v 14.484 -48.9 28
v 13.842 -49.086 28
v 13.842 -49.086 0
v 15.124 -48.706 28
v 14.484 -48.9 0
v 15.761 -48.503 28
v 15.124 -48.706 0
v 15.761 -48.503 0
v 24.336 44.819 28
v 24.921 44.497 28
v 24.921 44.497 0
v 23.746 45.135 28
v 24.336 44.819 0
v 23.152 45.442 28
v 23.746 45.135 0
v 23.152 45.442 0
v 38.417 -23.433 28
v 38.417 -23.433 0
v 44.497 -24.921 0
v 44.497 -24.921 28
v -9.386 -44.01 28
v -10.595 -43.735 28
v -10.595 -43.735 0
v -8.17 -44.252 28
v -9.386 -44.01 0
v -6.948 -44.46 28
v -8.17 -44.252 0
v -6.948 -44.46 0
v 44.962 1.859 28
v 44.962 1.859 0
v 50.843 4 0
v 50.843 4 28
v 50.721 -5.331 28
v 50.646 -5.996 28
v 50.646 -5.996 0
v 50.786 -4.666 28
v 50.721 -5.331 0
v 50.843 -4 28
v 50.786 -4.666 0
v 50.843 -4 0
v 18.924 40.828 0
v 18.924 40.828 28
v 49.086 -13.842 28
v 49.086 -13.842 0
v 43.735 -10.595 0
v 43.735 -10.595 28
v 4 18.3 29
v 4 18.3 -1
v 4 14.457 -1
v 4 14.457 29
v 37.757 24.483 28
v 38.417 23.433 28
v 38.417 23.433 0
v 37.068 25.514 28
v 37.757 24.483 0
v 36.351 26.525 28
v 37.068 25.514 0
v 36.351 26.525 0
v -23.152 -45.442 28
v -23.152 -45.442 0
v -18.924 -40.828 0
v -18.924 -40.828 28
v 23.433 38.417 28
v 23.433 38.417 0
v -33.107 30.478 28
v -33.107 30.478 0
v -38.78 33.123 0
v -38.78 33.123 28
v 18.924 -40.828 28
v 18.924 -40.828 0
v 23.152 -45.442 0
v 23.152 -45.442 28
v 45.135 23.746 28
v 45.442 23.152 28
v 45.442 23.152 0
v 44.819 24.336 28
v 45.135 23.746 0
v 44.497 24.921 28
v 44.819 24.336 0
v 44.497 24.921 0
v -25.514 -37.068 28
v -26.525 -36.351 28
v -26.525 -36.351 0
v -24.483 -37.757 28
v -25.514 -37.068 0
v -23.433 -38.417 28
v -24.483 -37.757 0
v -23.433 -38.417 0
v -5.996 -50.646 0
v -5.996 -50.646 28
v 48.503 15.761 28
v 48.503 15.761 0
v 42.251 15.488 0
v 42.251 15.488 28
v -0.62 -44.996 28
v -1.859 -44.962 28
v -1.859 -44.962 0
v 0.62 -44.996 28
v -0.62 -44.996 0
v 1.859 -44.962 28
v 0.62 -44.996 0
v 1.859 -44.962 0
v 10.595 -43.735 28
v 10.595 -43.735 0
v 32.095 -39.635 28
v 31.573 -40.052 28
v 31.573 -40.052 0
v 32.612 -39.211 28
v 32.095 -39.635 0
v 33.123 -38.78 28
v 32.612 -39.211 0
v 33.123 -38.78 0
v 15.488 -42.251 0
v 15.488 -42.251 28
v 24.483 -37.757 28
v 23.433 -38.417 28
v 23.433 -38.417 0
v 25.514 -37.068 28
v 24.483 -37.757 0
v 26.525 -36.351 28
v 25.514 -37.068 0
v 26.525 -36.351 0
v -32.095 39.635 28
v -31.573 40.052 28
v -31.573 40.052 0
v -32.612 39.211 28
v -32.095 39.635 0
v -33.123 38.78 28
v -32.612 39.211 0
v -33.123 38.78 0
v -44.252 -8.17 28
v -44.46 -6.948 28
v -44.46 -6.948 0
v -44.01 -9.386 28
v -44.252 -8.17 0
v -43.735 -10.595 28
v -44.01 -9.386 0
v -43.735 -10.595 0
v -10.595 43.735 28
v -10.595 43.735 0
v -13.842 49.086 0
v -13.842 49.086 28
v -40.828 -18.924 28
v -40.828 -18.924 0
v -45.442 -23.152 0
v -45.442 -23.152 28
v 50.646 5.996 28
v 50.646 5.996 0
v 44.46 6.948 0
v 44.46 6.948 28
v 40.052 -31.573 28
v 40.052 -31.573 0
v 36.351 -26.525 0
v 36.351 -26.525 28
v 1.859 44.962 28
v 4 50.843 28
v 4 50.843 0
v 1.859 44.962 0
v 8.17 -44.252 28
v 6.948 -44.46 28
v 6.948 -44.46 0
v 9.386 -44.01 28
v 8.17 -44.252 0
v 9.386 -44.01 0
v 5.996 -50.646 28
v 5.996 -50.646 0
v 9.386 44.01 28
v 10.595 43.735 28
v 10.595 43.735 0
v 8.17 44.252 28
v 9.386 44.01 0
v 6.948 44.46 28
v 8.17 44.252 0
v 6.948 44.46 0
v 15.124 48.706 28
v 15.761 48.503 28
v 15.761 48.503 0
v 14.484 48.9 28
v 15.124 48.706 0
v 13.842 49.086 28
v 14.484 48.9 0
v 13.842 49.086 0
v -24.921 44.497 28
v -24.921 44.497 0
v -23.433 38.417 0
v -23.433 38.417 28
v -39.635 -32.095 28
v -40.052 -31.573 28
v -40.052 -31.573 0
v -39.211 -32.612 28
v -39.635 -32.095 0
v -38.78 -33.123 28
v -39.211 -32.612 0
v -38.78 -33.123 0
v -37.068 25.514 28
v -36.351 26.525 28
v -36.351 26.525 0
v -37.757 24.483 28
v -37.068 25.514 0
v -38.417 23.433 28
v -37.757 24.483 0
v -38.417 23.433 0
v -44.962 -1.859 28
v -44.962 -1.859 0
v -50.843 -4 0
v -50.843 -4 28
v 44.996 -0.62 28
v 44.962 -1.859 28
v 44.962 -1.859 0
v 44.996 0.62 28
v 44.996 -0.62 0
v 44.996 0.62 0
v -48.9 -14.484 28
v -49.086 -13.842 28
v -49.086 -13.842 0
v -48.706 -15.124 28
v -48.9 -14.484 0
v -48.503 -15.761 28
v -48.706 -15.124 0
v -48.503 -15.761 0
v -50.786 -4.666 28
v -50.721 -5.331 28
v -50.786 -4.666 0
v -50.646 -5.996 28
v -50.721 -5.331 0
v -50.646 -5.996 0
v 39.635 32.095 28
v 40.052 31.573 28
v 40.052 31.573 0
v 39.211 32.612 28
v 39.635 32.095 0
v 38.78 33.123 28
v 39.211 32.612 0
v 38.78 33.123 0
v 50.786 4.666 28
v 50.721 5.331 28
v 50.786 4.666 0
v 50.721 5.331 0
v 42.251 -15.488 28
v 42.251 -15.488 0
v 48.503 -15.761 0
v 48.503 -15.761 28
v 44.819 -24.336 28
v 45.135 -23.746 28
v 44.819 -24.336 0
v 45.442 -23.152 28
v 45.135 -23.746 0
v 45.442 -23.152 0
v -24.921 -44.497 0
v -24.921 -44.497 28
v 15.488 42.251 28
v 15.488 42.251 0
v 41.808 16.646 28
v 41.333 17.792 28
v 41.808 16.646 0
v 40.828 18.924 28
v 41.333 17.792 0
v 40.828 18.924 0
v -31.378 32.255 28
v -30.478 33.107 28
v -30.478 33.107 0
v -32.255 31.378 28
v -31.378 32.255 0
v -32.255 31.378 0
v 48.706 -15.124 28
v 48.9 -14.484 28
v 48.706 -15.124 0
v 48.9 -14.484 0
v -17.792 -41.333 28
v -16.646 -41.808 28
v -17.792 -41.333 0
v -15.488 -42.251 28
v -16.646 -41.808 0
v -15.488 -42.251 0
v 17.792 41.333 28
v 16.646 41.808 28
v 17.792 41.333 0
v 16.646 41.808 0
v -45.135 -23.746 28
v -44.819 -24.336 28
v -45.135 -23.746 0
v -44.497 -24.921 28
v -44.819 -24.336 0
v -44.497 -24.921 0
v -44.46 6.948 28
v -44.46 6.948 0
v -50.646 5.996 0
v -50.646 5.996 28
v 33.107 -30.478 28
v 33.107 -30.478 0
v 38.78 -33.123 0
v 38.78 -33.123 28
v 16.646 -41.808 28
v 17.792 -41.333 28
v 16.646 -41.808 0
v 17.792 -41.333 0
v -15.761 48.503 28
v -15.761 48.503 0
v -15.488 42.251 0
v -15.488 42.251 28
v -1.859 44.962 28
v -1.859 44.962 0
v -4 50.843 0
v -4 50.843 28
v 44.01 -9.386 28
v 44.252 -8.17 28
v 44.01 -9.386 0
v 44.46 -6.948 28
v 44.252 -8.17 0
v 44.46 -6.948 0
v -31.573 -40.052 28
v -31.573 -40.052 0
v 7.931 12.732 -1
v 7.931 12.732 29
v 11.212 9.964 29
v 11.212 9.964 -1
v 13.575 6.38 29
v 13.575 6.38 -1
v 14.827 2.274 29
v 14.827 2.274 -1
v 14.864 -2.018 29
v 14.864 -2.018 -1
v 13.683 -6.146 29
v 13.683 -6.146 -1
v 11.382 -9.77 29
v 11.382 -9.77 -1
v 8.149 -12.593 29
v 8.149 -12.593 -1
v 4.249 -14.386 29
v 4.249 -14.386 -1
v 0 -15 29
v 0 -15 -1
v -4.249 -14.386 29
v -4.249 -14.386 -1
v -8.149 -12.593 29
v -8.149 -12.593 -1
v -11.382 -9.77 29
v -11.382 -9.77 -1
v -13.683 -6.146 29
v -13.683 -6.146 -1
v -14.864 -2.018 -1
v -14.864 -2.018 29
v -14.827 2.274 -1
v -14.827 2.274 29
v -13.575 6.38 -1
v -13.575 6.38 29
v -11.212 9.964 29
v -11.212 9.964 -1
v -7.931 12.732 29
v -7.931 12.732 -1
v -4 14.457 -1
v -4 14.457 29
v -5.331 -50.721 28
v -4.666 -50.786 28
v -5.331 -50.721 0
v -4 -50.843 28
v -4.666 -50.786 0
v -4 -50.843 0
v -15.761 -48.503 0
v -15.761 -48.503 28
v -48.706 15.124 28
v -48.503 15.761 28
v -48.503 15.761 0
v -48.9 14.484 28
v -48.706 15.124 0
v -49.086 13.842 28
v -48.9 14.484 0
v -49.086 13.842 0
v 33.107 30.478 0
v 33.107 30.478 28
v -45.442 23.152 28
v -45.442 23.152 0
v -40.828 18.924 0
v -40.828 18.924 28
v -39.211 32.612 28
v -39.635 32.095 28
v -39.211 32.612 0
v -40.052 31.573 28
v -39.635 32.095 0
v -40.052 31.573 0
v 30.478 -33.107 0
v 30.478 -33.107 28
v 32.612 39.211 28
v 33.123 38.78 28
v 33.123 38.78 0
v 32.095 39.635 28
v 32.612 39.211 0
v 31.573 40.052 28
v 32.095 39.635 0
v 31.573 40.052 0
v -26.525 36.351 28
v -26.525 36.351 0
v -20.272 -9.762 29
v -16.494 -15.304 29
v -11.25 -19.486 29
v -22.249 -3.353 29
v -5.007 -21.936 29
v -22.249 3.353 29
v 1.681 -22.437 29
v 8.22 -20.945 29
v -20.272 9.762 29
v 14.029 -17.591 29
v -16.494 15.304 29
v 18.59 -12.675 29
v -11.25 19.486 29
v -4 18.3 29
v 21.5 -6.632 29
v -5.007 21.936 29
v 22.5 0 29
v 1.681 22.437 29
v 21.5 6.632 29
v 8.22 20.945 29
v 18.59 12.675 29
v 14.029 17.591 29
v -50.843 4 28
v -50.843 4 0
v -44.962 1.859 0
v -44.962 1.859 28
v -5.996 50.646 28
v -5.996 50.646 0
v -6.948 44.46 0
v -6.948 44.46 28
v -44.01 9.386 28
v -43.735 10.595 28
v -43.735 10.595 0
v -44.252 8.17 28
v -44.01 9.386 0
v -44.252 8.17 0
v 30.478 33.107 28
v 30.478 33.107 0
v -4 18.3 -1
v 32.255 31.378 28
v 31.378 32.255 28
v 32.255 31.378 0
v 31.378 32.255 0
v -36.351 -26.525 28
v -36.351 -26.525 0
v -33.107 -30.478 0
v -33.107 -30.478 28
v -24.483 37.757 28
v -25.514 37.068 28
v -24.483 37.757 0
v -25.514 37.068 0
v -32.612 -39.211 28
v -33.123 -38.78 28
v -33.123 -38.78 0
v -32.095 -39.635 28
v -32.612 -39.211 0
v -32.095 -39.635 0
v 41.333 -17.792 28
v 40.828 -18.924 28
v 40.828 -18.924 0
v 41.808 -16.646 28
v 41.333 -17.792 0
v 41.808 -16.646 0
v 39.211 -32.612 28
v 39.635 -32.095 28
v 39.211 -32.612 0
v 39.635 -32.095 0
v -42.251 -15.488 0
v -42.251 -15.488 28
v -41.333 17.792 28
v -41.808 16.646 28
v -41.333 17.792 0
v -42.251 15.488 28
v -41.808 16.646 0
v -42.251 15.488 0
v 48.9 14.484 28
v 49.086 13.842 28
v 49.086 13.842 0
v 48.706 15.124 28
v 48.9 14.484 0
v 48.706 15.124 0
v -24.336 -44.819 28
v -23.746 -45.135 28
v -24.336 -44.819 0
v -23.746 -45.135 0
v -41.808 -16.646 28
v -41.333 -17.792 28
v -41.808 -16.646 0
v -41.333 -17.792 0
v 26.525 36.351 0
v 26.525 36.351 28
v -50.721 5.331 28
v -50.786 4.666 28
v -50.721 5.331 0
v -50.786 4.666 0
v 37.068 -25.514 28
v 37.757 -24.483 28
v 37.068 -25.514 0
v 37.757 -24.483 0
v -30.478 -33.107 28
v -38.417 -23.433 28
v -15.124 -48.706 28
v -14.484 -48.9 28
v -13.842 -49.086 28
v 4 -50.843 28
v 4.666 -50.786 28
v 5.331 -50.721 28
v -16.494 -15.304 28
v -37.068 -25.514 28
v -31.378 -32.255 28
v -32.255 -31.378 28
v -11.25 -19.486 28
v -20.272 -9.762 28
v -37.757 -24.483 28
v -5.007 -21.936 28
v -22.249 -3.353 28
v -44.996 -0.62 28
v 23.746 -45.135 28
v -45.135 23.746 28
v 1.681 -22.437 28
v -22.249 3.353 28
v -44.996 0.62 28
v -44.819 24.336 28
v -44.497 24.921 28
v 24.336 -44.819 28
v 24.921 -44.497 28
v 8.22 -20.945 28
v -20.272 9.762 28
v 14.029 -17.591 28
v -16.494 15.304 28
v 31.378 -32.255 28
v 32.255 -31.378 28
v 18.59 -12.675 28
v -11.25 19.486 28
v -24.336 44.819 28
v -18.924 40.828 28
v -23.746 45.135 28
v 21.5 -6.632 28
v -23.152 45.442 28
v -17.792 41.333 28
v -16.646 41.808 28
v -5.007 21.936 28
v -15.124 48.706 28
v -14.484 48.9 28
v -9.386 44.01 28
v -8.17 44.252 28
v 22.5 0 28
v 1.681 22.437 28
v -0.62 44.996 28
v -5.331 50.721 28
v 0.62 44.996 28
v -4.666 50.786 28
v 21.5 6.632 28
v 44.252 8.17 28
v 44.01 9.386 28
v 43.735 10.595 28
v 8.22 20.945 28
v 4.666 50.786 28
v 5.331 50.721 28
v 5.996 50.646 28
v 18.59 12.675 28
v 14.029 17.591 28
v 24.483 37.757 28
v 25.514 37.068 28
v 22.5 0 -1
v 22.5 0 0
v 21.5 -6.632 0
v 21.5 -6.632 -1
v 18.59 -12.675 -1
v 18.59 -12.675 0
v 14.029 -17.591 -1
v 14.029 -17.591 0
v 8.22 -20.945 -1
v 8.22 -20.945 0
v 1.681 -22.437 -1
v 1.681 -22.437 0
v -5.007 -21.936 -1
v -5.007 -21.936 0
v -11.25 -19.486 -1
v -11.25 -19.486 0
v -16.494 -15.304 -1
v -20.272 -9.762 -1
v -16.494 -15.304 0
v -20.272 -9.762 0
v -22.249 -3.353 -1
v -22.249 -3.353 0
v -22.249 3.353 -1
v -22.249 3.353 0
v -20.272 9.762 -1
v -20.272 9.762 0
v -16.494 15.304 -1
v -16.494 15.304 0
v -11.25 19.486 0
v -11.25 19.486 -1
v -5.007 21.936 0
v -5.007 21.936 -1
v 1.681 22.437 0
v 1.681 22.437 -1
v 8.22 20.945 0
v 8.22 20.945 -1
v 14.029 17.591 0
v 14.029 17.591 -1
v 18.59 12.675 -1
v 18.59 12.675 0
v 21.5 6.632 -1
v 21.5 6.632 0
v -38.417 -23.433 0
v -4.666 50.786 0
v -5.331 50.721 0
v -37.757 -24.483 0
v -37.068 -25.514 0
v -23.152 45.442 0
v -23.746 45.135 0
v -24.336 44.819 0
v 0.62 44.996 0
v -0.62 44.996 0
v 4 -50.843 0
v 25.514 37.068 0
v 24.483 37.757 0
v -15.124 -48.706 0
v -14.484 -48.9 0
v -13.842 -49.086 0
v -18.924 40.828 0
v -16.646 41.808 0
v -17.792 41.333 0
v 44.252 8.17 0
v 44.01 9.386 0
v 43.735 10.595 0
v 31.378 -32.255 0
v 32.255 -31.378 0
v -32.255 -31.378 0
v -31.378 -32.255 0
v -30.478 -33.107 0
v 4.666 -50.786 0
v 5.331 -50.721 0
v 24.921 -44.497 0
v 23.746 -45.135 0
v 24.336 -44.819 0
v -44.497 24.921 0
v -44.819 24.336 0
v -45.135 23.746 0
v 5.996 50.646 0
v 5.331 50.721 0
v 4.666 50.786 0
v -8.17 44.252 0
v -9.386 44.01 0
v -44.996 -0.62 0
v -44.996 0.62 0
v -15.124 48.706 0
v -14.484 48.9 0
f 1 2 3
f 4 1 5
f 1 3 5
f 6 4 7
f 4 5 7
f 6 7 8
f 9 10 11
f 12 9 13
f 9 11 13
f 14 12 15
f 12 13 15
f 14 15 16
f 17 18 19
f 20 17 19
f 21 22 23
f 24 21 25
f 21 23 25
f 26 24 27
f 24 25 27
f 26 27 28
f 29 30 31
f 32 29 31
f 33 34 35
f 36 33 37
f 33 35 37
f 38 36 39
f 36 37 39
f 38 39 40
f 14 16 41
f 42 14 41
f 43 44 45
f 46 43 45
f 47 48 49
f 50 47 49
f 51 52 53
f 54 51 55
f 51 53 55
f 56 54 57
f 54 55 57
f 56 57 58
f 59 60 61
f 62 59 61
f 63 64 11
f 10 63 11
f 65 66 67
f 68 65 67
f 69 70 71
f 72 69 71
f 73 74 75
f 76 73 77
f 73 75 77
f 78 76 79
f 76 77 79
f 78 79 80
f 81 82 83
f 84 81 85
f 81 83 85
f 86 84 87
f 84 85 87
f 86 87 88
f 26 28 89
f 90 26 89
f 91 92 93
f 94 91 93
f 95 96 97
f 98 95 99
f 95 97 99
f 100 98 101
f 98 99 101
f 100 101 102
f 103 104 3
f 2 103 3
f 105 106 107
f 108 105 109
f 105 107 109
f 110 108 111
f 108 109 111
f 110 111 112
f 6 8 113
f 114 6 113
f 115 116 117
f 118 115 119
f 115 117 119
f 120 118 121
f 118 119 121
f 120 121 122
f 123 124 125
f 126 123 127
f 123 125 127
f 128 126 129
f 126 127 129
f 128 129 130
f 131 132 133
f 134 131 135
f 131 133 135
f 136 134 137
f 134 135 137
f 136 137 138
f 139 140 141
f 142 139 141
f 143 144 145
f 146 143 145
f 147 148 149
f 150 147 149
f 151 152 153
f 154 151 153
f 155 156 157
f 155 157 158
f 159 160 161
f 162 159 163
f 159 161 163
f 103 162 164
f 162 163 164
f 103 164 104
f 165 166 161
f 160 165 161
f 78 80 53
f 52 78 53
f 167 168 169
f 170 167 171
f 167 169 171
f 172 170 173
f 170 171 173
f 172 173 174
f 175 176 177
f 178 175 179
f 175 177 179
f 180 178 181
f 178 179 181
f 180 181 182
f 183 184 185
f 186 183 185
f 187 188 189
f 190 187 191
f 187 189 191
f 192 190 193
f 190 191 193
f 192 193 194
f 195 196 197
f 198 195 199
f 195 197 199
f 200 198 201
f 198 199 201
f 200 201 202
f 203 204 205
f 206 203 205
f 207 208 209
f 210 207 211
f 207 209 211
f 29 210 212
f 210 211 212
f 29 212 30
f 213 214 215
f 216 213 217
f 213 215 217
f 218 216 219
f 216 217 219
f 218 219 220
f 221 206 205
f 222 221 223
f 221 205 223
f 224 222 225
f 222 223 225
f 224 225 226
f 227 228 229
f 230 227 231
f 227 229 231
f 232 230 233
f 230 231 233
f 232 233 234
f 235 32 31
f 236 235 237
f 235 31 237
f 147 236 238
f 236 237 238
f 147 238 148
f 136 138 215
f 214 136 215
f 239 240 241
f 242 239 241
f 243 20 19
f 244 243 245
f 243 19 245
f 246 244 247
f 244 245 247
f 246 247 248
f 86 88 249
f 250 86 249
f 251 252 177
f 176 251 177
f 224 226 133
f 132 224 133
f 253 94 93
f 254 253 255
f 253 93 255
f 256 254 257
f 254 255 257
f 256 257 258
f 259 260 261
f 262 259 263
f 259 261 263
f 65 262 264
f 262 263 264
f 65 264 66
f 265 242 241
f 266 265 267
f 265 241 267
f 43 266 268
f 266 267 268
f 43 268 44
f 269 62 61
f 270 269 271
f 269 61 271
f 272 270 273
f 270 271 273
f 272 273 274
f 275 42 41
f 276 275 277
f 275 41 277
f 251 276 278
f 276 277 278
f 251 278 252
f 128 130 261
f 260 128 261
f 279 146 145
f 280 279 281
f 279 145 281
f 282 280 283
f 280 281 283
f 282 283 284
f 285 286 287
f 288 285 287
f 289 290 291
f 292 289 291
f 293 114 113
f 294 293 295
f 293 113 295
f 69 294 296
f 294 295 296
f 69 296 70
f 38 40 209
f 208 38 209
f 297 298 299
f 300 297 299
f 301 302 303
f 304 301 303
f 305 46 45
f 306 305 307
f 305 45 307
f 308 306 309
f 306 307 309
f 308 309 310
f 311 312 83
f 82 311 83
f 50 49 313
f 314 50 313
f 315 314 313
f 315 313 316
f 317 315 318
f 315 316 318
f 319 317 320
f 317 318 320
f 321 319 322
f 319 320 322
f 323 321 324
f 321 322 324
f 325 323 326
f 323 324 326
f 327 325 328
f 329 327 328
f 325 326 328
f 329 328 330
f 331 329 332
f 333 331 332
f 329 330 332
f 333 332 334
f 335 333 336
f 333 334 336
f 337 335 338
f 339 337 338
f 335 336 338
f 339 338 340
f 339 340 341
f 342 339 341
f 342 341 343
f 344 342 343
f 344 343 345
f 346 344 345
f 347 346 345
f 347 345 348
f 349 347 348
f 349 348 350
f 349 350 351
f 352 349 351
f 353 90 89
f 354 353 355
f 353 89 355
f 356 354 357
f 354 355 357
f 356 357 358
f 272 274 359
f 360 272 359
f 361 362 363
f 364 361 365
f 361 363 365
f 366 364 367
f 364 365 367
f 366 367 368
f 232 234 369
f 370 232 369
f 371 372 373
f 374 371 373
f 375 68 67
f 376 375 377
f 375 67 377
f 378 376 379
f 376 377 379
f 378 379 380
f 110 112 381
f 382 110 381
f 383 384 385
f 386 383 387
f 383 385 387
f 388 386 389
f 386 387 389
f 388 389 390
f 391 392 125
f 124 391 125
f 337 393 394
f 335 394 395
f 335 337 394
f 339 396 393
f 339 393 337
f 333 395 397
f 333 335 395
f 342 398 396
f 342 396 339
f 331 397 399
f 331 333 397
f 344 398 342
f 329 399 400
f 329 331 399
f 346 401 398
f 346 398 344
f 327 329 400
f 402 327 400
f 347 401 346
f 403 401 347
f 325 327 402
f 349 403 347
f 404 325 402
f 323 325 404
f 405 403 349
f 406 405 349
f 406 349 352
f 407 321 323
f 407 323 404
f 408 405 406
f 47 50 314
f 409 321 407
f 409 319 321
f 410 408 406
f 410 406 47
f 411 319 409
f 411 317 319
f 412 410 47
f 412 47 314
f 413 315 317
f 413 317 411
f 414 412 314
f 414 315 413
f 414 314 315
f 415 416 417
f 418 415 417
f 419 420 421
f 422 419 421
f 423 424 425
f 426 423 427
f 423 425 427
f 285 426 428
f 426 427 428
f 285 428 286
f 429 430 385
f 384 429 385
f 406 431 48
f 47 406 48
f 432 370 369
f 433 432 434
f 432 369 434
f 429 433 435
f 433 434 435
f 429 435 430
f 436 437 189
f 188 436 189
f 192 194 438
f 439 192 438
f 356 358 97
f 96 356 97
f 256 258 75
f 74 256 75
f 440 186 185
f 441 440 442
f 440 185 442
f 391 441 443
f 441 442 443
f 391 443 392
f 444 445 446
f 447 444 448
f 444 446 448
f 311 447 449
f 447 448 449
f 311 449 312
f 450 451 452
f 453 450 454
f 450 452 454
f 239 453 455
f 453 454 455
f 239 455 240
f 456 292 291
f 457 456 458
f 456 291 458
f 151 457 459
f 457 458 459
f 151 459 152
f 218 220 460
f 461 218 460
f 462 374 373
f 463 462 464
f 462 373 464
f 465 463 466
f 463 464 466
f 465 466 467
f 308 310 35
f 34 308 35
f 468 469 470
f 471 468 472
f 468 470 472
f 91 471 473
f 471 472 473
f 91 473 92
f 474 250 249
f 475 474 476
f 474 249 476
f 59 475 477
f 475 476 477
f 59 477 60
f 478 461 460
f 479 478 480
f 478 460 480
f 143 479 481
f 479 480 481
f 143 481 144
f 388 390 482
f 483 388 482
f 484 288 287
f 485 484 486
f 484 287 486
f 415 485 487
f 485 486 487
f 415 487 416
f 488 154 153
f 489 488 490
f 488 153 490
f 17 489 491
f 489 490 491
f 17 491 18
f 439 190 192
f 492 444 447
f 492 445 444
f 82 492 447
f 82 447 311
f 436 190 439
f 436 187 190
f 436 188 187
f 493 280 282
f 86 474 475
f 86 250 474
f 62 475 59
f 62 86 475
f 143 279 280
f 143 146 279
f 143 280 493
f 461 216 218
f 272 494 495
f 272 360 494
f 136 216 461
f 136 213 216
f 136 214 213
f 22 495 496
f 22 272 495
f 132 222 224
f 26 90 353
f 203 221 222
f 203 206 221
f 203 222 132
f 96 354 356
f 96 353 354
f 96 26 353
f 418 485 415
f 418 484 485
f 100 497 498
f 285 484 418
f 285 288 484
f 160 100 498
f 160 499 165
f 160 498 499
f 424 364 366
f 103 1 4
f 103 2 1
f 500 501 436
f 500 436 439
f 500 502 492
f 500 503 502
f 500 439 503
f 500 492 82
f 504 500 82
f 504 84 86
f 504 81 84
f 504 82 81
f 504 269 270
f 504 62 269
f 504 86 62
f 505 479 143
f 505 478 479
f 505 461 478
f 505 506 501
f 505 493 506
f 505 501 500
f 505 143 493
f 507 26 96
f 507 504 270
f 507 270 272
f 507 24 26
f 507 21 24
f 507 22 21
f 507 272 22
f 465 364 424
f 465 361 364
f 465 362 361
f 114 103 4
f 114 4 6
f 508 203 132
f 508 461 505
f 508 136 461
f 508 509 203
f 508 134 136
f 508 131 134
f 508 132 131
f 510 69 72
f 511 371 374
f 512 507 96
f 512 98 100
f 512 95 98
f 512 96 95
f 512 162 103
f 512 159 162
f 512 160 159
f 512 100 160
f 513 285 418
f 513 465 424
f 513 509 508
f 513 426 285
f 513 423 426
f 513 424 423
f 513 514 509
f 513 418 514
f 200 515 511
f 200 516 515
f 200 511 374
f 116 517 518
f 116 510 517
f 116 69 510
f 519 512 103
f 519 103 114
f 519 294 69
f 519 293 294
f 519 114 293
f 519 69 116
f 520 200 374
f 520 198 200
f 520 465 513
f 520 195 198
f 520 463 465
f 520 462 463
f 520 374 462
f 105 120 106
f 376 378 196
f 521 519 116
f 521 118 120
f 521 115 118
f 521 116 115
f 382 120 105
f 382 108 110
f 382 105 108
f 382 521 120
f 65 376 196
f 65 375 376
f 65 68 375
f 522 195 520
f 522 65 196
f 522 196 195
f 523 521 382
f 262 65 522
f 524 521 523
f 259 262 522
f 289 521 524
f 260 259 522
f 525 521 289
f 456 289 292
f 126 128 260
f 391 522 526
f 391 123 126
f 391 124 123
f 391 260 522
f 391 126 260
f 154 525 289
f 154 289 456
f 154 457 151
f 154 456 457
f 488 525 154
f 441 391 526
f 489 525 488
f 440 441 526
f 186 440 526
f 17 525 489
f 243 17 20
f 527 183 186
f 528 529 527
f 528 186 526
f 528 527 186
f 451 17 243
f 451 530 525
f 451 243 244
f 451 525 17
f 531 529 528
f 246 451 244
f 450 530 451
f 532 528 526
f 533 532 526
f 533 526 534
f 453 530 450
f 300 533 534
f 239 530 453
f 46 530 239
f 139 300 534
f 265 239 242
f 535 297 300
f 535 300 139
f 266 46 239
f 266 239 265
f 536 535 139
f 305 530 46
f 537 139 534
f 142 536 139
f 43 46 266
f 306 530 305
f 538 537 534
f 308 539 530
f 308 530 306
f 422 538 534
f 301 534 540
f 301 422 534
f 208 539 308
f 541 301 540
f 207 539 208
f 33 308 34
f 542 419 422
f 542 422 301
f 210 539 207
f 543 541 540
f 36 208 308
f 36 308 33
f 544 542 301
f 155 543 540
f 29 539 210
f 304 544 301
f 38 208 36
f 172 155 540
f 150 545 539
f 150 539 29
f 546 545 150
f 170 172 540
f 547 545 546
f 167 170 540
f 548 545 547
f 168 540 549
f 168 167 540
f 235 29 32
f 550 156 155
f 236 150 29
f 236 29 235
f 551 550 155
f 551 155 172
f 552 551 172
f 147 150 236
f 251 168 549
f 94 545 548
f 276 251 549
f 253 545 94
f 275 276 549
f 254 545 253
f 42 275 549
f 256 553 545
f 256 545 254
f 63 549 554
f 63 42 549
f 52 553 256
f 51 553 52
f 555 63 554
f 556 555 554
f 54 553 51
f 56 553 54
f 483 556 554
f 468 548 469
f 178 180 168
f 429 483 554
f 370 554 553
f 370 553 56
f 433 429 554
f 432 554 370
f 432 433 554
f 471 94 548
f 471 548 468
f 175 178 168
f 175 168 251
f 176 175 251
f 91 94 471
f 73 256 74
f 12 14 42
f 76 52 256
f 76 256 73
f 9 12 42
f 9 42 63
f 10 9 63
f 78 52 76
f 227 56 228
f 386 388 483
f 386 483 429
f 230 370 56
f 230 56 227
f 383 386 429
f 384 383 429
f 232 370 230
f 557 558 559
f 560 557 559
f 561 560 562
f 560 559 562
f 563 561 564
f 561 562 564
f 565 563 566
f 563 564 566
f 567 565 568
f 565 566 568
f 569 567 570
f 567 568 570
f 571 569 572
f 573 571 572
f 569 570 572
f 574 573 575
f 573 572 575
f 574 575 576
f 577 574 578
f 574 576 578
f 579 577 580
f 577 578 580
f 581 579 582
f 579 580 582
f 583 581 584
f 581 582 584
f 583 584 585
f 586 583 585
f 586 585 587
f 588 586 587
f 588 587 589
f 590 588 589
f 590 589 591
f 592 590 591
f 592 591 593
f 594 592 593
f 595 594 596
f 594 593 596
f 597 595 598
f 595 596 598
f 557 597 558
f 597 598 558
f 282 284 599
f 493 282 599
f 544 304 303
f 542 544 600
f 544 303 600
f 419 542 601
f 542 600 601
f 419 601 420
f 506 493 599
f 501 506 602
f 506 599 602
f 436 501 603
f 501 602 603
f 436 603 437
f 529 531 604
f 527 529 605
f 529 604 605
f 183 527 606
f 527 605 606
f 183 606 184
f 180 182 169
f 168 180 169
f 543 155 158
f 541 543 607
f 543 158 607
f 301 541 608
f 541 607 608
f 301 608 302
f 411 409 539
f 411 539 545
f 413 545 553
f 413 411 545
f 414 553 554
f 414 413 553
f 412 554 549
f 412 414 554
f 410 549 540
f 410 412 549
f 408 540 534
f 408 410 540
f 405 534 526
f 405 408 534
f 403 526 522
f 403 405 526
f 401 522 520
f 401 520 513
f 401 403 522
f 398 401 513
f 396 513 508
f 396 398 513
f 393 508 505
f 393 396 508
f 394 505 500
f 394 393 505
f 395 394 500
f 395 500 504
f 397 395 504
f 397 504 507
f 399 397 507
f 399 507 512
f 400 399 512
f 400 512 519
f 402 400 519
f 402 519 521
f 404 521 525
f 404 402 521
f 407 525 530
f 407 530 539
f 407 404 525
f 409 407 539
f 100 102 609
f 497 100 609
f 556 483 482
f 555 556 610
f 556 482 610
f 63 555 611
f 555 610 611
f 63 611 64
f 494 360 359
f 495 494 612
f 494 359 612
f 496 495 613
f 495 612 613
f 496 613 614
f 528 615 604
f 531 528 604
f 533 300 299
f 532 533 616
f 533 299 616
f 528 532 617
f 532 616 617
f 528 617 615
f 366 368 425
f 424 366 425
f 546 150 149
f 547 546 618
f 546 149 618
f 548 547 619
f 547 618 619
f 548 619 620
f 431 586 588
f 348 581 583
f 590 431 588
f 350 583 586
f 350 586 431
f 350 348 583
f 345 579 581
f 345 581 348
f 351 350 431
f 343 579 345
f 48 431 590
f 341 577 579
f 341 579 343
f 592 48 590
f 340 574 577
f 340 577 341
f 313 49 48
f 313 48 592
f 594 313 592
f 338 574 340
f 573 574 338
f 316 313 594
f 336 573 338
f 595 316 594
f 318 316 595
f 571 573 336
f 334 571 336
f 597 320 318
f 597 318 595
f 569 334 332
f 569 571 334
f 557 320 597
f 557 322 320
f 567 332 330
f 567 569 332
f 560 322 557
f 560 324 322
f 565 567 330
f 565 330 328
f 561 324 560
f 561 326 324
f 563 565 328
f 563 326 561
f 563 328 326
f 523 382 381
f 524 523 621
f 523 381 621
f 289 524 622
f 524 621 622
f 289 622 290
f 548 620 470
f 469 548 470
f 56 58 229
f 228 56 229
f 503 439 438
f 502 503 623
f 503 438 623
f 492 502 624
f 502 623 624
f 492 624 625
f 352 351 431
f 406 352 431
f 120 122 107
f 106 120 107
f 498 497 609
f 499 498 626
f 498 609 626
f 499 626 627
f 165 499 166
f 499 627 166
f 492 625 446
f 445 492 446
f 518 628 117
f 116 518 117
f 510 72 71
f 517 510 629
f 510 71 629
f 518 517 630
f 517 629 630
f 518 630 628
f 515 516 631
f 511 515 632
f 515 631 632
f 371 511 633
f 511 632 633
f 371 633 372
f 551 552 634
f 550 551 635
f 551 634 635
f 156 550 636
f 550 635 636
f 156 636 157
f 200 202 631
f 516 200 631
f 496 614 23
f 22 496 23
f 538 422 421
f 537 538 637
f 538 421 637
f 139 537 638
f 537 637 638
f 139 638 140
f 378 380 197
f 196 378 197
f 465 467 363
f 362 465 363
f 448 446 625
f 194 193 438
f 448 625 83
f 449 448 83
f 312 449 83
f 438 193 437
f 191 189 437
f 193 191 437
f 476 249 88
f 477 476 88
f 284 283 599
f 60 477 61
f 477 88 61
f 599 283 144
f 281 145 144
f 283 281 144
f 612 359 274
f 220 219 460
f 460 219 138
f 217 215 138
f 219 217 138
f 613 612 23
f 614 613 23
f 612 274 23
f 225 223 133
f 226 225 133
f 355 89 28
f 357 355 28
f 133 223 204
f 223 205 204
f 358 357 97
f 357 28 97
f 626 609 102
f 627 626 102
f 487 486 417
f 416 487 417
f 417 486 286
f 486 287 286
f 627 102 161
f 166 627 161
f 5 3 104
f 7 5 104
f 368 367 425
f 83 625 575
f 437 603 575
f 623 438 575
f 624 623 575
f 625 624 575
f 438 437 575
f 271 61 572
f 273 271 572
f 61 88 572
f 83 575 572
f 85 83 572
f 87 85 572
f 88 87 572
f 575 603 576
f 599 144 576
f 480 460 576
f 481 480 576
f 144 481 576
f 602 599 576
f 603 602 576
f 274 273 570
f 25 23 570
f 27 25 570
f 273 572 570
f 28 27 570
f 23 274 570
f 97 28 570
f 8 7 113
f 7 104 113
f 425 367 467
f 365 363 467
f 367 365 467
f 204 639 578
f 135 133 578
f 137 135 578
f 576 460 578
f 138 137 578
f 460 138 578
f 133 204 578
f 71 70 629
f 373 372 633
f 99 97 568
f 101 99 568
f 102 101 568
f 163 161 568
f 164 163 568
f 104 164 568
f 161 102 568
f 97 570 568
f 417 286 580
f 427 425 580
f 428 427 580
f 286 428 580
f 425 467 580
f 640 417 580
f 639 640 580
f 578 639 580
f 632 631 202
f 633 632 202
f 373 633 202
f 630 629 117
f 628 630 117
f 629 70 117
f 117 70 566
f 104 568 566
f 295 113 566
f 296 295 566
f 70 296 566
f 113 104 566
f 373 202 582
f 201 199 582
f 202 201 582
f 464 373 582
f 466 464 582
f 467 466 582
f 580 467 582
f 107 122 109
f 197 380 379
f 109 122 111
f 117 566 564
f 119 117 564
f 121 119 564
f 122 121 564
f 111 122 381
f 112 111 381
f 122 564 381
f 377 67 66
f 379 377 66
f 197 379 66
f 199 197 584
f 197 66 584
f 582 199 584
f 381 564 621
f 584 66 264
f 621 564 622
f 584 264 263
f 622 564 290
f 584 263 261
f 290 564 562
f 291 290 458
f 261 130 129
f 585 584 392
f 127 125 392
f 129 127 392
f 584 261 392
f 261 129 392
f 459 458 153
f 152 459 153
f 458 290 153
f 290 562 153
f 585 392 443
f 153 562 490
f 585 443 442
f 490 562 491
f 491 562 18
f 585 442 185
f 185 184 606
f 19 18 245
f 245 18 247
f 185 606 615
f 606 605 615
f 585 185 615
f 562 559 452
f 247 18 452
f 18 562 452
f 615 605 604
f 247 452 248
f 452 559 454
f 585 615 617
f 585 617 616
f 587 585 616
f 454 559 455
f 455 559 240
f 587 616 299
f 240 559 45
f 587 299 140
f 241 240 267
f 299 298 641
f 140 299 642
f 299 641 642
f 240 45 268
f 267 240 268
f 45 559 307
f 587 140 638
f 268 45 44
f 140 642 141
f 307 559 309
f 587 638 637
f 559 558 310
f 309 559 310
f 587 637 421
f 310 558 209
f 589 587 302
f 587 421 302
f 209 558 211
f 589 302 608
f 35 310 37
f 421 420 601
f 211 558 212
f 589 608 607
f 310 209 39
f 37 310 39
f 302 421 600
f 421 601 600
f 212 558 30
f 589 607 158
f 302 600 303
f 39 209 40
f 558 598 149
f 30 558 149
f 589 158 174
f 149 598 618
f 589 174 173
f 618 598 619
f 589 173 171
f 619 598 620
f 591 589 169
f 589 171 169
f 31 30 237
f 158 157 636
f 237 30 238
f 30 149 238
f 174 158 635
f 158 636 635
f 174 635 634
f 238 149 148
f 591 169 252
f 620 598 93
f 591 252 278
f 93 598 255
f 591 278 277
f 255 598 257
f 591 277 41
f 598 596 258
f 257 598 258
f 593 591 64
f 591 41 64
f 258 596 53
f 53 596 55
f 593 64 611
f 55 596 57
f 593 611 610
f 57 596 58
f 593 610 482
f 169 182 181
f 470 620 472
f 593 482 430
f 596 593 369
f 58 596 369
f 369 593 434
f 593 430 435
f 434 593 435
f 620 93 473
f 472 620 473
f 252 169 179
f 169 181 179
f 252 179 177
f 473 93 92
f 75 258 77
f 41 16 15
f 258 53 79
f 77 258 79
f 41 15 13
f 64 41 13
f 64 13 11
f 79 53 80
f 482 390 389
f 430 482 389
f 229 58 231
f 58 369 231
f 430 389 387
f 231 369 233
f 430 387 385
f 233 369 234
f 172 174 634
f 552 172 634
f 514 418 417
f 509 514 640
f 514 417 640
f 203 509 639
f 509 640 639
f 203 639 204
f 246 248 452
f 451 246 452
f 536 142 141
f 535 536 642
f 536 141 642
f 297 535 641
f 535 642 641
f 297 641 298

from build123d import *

# Parameters (mm, degrees)
SKETCH_1_R               = 51
EXTRUDE_1_DEPTH          = 28
SKETCH_2_R               = 22.5
EXTRUDE_2_DEPTH          = 1
EXTRUDE_START            = 1
SKETCH_3_R               = 22.5
EXTRUDE_3_DEPTH          = 1
CUT_EXTRUDE_1_REACH      = 80.115
CUT_EXTRUDE_2_REACH      = 79.737
PATTERN_CIRCULAR_1_COUNT = 32


with BuildPart() as part:
    # 草图1 → 凸台-拉伸1 (new body)
    with BuildSketch(Plane.XY):
        Circle(SKETCH_1_R)
    extrude(amount=EXTRUDE_1_DEPTH)

    # 草图2 → 凸台-拉伸2 (add)
    with BuildSketch(Plane(origin=(0, 0, 0), x_dir=(-1, 0, 0), z_dir=(0, 0, -1))):
        with Locations(Location((0, 0, 0), (0, 0, 180))):
            Circle(SKETCH_2_R)
    extrude(amount=EXTRUDE_2_DEPTH)

    # 草图3 → 凸台-拉伸3 (add)
    with BuildSketch(Plane.XY.offset(28).offset(EXTRUDE_START)):
        Circle(SKETCH_3_R)
    extrude(amount=-EXTRUDE_3_DEPTH)

    # 草图4 → 切除-拉伸1 (cut, up to next)
    with BuildSketch(Plane(origin=(0, 0, -1), x_dir=(-1, 0, 0), z_dir=(0, 0, -1)), mode=Mode.PRIVATE) as cut_extrude_1_sk1:
        with BuildLine():
            Line((-4, 18.3), (-4, 14.456832295))
            ThreePointArc((-4, 14.456832295), (0, -15), (4, 14.456832295))
            Line((4, 14.456832295), (4, 18.3))
            Line((4, 18.3), (-4, 18.3))
        make_face()
    cut_extrude_1_tool1 = extrude(cut_extrude_1_sk1.sketch, amount=-CUT_EXTRUDE_1_REACH, mode=Mode.PRIVATE) & part.part
    add(cut_extrude_1_tool1.solids().sort_by_distance((0, 0.627325, -1))[0], mode=Mode.SUBTRACT)

    # 草图5 → 切除-拉伸2 (cut, up to next)
    with BuildSketch(Plane(origin=(0, 0, 0), x_dir=(-1, 0, 0), z_dir=(0, 0, -1)), mode=Mode.PRIVATE) as cut_extrude_2_sk1:
        with BuildLine():
            Line((-4, 50.842895276), (-1.859372488, 44.961569523))
            ThreePointArc((-1.859372488, 44.961569523), (0, 45), (1.859372488, 44.961569523))
            Line((1.859372488, 44.961569523), (4, 50.842895276))
            ThreePointArc((4, 50.842895276), (0, 51), (-4, 50.842895276))
        make_face()
    cut_extrude_2_tool1 = extrude(cut_extrude_2_sk1.sketch, amount=-CUT_EXTRUDE_2_REACH, mode=Mode.PRIVATE) & part.part
    cut_extrude_2 = cut_extrude_2_tool1.solids().sort_by_distance((0, 48.332211, 0))[0]
    add(cut_extrude_2, mode=Mode.SUBTRACT)

    # 阵列(圆周)1: 切除-拉伸2 ×32 about axis
    pattern_circular_1_axis = Axis((0, 0, 0), (0, 0, 1))
    for i in range(1, PATTERN_CIRCULAR_1_COUNT):
        add(cut_extrude_2.rotate(pattern_circular_1_axis, i * 360 / PATTERN_CIRCULAR_1_COUNT), mode=Mode.SUBTRACT)


solid = part.part
